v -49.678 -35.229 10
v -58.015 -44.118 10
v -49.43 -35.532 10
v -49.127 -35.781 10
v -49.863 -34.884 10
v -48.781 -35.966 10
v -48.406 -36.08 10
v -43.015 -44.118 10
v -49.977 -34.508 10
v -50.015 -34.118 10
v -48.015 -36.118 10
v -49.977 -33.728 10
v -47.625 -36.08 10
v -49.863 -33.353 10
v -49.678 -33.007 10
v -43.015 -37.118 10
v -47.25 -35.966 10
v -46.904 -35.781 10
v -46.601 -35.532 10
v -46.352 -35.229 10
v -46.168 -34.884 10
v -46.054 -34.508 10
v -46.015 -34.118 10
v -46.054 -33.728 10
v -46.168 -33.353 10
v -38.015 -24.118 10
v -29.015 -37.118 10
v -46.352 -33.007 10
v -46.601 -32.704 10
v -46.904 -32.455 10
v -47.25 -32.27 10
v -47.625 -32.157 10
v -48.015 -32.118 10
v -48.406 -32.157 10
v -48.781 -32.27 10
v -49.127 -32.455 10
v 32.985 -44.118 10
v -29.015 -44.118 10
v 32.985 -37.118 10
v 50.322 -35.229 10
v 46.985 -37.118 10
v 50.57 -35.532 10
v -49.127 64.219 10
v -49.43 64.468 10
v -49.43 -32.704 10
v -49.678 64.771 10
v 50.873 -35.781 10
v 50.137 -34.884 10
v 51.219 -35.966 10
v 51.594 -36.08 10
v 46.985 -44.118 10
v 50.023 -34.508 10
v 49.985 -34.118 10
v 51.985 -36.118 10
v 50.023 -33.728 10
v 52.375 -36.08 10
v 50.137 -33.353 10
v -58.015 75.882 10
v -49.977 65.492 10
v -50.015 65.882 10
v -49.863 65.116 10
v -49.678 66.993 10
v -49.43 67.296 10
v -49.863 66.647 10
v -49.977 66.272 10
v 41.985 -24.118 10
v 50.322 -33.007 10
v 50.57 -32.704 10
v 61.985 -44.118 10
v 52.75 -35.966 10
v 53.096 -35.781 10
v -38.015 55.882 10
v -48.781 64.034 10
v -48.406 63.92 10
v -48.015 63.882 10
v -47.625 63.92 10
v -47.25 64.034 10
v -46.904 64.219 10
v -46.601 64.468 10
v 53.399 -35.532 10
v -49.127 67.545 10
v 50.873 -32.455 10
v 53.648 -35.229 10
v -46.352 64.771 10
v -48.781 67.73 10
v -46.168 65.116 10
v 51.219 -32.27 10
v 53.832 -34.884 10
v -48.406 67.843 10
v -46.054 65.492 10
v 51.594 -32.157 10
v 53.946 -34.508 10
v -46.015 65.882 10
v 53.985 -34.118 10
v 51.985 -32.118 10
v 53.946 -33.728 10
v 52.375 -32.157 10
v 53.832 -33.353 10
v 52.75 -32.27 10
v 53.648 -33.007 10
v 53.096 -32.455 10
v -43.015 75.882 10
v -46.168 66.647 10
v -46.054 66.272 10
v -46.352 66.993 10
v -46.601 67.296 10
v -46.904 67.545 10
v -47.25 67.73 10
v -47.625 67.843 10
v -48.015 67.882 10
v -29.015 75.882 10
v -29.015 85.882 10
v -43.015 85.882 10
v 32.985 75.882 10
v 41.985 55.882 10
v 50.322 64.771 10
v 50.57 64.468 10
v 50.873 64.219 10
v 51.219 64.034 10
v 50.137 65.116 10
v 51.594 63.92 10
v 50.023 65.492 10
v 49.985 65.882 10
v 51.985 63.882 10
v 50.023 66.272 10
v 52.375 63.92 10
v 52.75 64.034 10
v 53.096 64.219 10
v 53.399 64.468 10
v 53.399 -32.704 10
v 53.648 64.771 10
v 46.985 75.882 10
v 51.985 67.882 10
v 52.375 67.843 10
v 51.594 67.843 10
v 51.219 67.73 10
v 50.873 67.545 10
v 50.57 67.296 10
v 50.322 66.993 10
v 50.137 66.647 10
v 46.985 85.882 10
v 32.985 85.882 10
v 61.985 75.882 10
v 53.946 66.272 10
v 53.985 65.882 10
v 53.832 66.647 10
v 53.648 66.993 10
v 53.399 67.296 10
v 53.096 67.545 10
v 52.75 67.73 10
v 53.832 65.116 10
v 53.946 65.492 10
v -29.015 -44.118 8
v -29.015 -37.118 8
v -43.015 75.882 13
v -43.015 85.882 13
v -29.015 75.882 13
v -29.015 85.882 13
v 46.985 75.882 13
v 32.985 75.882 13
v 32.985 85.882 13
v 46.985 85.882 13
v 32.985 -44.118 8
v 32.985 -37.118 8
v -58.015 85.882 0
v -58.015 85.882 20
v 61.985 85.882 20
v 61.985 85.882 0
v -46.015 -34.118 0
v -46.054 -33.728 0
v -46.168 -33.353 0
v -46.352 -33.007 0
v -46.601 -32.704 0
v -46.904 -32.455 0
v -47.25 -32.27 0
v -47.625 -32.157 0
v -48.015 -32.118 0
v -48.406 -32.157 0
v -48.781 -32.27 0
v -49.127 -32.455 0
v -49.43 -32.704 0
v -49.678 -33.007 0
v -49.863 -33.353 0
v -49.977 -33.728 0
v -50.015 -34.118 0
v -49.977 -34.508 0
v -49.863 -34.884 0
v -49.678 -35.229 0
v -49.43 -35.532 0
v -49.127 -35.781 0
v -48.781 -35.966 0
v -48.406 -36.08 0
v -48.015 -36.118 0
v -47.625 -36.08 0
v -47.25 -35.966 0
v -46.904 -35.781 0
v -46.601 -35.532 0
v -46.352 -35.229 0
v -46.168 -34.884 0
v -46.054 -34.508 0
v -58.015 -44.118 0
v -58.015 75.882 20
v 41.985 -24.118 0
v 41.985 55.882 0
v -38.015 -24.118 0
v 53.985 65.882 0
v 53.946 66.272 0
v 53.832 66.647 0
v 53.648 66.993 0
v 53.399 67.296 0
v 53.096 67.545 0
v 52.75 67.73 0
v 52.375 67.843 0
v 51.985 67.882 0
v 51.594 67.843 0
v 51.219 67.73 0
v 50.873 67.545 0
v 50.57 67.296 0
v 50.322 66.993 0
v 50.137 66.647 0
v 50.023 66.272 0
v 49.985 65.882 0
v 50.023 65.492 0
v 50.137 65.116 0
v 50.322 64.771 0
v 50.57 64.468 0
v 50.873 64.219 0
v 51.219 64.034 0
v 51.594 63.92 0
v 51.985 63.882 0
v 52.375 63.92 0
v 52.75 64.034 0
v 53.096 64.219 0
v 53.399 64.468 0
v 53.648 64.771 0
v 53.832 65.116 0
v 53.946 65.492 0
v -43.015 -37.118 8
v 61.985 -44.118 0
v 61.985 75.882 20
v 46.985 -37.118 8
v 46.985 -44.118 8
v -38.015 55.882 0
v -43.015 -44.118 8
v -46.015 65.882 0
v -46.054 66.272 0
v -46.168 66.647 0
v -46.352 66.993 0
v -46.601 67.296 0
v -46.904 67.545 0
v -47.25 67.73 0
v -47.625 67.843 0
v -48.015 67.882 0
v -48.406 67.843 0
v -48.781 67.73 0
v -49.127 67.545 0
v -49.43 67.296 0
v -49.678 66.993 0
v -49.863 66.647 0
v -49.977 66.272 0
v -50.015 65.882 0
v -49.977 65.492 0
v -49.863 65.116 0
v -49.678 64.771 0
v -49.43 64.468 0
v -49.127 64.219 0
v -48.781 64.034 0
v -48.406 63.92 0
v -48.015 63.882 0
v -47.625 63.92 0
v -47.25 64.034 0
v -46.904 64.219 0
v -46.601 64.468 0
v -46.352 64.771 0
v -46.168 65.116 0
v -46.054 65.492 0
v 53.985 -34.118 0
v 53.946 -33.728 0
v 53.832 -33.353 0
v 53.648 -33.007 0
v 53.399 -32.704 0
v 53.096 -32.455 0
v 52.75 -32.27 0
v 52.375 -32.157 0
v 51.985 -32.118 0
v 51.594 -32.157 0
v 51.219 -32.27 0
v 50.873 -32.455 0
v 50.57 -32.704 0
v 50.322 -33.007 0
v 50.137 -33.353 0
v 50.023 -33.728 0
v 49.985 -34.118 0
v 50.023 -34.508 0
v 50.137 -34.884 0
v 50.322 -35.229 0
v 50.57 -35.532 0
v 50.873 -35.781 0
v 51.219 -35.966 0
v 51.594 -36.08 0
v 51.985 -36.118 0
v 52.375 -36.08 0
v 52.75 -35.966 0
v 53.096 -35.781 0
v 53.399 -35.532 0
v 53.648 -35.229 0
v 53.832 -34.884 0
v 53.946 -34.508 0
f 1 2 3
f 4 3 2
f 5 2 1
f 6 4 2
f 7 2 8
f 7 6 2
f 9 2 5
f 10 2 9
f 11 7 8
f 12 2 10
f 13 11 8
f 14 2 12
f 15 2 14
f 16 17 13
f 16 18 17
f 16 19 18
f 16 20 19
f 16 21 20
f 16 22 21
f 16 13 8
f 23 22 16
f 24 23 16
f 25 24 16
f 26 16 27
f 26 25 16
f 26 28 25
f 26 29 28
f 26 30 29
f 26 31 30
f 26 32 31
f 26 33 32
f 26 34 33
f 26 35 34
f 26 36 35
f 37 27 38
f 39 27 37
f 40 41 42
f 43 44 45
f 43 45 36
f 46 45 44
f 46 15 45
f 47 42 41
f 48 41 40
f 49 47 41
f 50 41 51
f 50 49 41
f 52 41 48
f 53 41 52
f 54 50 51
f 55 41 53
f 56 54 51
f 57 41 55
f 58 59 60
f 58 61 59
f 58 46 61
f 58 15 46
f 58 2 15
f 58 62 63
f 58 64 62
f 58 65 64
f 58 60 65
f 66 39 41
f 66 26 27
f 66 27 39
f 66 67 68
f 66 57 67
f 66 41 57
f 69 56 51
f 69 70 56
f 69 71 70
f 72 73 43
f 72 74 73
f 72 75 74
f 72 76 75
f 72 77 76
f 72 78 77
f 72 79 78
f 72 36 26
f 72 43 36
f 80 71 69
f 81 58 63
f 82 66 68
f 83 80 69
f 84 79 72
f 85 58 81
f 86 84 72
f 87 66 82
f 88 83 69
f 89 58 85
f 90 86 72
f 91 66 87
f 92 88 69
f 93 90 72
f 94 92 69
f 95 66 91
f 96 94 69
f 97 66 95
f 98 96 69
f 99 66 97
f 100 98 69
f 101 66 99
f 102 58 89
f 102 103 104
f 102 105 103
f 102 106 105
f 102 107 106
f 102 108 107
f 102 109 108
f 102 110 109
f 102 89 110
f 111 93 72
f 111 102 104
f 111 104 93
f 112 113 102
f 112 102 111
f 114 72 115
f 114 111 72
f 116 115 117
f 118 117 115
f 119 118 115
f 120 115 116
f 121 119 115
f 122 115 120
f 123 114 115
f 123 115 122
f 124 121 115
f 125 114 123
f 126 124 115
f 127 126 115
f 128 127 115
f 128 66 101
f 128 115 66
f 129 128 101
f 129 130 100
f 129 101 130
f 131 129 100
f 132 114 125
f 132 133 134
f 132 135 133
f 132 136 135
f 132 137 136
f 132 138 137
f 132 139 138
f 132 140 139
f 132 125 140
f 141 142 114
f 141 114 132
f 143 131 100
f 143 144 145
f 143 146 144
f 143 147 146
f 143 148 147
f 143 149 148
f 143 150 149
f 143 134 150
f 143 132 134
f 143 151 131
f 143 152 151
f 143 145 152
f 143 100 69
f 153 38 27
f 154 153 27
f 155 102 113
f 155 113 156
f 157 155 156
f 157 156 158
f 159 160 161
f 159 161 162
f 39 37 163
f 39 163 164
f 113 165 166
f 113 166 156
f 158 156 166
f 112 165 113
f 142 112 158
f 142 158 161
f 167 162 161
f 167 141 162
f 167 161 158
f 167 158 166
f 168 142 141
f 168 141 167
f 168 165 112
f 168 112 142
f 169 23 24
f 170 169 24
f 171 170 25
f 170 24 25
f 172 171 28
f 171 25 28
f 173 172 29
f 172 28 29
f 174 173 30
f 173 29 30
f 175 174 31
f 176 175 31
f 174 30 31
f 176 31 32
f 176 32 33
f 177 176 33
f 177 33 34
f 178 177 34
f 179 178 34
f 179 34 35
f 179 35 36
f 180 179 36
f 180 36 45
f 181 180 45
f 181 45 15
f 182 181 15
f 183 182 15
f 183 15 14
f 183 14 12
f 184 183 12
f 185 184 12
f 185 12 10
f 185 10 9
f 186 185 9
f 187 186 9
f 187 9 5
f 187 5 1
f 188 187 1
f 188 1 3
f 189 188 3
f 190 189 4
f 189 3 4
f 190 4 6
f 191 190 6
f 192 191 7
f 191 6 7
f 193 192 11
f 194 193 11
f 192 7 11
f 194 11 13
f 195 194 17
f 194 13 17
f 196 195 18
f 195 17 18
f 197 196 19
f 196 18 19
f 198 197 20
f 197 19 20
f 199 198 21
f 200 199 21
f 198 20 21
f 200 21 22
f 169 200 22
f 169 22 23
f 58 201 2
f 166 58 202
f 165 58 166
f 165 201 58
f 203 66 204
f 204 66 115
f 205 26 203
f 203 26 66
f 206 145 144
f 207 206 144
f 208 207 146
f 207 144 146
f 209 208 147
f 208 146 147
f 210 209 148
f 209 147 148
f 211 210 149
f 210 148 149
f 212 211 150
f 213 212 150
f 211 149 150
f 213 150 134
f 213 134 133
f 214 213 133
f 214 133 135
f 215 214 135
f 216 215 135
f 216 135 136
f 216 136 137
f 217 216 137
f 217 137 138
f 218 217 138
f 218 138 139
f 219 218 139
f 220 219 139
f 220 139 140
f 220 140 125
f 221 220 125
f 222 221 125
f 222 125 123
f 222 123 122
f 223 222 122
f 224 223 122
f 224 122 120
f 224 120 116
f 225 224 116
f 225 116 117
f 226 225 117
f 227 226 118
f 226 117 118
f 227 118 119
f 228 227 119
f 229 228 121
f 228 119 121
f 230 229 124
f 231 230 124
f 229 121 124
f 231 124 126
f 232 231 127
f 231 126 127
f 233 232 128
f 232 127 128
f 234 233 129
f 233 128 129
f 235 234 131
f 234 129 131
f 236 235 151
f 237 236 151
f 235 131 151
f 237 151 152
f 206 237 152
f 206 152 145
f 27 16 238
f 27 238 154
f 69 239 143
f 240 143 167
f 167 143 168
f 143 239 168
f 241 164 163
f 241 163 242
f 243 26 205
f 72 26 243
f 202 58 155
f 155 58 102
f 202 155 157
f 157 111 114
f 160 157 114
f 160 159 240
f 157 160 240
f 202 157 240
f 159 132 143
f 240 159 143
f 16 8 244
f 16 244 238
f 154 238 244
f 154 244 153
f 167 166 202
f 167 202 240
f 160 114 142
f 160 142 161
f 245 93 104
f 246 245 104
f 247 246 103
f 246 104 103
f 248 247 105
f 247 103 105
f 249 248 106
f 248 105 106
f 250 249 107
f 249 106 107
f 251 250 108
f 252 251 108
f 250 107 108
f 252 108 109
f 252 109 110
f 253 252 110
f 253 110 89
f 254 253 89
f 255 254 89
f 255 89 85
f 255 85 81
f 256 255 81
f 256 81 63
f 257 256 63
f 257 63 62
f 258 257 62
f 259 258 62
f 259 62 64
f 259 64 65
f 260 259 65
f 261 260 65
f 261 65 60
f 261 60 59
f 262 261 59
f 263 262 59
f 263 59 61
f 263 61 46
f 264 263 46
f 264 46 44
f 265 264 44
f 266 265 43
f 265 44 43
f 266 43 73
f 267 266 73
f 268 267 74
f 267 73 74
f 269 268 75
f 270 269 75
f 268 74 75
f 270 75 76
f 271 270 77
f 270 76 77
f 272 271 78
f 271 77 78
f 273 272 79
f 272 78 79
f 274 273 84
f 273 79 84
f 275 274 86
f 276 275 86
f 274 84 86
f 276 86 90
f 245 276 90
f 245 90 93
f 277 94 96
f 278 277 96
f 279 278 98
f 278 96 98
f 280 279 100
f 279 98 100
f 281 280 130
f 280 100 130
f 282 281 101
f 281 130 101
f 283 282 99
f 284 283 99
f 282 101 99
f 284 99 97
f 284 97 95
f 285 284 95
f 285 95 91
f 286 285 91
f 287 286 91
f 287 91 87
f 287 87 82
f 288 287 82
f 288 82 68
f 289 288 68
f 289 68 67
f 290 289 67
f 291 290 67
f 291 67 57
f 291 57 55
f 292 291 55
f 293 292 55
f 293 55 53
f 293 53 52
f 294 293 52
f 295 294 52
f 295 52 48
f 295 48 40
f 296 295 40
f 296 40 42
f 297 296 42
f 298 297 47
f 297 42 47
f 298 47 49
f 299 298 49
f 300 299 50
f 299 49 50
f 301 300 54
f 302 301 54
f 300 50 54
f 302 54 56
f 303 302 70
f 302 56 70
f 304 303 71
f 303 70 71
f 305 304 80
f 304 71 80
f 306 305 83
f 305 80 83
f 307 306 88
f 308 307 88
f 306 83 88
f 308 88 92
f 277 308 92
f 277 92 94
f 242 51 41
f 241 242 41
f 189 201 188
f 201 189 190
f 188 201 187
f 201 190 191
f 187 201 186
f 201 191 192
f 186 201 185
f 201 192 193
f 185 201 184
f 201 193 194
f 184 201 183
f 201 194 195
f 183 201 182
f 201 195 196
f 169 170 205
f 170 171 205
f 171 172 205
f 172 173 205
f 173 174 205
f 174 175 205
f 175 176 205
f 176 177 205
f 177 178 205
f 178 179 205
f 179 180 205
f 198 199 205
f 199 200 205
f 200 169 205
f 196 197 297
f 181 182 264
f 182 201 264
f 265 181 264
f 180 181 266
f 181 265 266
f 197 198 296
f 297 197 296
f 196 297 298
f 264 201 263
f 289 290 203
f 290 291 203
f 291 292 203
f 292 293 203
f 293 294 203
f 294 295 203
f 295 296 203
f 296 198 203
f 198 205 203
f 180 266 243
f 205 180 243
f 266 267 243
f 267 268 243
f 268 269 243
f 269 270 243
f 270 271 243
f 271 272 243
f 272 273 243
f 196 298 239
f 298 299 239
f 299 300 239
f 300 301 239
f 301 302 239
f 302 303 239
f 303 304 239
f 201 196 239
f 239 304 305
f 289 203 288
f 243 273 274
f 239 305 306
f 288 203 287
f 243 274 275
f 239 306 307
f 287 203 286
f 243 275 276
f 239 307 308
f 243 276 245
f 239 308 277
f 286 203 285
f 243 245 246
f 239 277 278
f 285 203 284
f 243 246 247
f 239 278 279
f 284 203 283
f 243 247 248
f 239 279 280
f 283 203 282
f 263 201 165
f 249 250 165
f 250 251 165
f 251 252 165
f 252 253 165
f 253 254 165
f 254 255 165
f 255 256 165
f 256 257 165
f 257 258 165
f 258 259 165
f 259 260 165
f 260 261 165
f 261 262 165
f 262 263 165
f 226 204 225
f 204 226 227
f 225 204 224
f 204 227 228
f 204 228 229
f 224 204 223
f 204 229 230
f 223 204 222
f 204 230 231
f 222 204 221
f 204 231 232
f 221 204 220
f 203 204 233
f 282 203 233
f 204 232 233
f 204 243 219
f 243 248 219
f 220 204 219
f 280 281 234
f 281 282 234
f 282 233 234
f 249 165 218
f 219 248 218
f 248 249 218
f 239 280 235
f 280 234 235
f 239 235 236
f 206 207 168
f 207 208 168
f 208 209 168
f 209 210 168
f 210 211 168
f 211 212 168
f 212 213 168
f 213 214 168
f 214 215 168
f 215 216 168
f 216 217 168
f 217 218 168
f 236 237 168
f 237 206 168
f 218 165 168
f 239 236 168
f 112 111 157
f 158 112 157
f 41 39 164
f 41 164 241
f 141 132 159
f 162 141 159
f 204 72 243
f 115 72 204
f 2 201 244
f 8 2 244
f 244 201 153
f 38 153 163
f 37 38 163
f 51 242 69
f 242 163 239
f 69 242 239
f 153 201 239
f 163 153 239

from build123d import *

# Parameters (mm, degrees)
F0_W      = 120
F0_H      = 130
F1_DEPTH  = 10
F2_W      = 120
F2_H      = 10
F3_DEPTH  = 10
F4_W      = 14
F4_H      = 3
F5_DEPTH  = 25
F6_DEPTH  = 25
F7_R      = 2
F8_DEPTH  = 25
F9_W      = 14
F9_H      = 7
F10_DEPTH = 2
F11_W     = 80
F11_H     = 80
F12_DEPTH = 25


with BuildPart() as f1:
    # F0 (on Top) → F1 (new body)
    with BuildSketch(Plane.XY):
        with Locations((1.984598, 20.88183)):
            Rectangle(F0_W, F0_H)
    extrude(amount=F1_DEPTH)

    # F2 (on face) → F3 (join)
    with BuildSketch(Plane.XY.offset(10)):
        with Locations((1.984598, 80.88183)):
            Rectangle(F2_W, F2_H)
    extrude(amount=F3_DEPTH)

    # F4 (on face) → F5 (cut)
    with BuildSketch(Plane.XZ.offset(-75.88183)):
        with Locations((-36.015402, 11.5)):
            Rectangle(F4_W, F4_H)
    extrude(amount=-F5_DEPTH, mode=Mode.SUBTRACT)

    # F4 (on face) → F6 (cut)
    with BuildSketch(Plane.XZ.offset(-75.88183)):
        with Locations((39.984598, 11.5)):
            Rectangle(F4_W, F4_H)
    extrude(amount=-F6_DEPTH, mode=Mode.SUBTRACT)

    # F7 (on face) → F8 (cut)
    with BuildSketch(Plane.XY.offset(10)):
        with Locations((-48.015402, 65.88183)):
            Circle(F7_R)
        with Locations((51.984598, 65.88183)):
            Circle(F7_R)
        with Locations((51.984598, -34.11817)):
            Circle(F7_R)
        with Locations((-48.015402, -34.11817)):
            Circle(F7_R)
    extrude(amount=-F8_DEPTH, mode=Mode.SUBTRACT)

    # F9 (on face) → F10 (cut)
    with BuildSketch(Plane.XY.offset(10)):
        with Locations((-36.015402, -40.61817)):
            Rectangle(F9_W, F9_H)
        with Locations((39.984598, -40.61817)):
            Rectangle(F9_W, F9_H)
    extrude(amount=-F10_DEPTH, mode=Mode.SUBTRACT)

    # F11 (on face) → F12 (cut)
    with BuildSketch(Plane.XY.offset(10)):
        with Locations((1.984598, 15.88183)):
            Rectangle(F11_W, F11_H)
    extrude(amount=-F12_DEPTH, mode=Mode.SUBTRACT)


solid = f1.part
